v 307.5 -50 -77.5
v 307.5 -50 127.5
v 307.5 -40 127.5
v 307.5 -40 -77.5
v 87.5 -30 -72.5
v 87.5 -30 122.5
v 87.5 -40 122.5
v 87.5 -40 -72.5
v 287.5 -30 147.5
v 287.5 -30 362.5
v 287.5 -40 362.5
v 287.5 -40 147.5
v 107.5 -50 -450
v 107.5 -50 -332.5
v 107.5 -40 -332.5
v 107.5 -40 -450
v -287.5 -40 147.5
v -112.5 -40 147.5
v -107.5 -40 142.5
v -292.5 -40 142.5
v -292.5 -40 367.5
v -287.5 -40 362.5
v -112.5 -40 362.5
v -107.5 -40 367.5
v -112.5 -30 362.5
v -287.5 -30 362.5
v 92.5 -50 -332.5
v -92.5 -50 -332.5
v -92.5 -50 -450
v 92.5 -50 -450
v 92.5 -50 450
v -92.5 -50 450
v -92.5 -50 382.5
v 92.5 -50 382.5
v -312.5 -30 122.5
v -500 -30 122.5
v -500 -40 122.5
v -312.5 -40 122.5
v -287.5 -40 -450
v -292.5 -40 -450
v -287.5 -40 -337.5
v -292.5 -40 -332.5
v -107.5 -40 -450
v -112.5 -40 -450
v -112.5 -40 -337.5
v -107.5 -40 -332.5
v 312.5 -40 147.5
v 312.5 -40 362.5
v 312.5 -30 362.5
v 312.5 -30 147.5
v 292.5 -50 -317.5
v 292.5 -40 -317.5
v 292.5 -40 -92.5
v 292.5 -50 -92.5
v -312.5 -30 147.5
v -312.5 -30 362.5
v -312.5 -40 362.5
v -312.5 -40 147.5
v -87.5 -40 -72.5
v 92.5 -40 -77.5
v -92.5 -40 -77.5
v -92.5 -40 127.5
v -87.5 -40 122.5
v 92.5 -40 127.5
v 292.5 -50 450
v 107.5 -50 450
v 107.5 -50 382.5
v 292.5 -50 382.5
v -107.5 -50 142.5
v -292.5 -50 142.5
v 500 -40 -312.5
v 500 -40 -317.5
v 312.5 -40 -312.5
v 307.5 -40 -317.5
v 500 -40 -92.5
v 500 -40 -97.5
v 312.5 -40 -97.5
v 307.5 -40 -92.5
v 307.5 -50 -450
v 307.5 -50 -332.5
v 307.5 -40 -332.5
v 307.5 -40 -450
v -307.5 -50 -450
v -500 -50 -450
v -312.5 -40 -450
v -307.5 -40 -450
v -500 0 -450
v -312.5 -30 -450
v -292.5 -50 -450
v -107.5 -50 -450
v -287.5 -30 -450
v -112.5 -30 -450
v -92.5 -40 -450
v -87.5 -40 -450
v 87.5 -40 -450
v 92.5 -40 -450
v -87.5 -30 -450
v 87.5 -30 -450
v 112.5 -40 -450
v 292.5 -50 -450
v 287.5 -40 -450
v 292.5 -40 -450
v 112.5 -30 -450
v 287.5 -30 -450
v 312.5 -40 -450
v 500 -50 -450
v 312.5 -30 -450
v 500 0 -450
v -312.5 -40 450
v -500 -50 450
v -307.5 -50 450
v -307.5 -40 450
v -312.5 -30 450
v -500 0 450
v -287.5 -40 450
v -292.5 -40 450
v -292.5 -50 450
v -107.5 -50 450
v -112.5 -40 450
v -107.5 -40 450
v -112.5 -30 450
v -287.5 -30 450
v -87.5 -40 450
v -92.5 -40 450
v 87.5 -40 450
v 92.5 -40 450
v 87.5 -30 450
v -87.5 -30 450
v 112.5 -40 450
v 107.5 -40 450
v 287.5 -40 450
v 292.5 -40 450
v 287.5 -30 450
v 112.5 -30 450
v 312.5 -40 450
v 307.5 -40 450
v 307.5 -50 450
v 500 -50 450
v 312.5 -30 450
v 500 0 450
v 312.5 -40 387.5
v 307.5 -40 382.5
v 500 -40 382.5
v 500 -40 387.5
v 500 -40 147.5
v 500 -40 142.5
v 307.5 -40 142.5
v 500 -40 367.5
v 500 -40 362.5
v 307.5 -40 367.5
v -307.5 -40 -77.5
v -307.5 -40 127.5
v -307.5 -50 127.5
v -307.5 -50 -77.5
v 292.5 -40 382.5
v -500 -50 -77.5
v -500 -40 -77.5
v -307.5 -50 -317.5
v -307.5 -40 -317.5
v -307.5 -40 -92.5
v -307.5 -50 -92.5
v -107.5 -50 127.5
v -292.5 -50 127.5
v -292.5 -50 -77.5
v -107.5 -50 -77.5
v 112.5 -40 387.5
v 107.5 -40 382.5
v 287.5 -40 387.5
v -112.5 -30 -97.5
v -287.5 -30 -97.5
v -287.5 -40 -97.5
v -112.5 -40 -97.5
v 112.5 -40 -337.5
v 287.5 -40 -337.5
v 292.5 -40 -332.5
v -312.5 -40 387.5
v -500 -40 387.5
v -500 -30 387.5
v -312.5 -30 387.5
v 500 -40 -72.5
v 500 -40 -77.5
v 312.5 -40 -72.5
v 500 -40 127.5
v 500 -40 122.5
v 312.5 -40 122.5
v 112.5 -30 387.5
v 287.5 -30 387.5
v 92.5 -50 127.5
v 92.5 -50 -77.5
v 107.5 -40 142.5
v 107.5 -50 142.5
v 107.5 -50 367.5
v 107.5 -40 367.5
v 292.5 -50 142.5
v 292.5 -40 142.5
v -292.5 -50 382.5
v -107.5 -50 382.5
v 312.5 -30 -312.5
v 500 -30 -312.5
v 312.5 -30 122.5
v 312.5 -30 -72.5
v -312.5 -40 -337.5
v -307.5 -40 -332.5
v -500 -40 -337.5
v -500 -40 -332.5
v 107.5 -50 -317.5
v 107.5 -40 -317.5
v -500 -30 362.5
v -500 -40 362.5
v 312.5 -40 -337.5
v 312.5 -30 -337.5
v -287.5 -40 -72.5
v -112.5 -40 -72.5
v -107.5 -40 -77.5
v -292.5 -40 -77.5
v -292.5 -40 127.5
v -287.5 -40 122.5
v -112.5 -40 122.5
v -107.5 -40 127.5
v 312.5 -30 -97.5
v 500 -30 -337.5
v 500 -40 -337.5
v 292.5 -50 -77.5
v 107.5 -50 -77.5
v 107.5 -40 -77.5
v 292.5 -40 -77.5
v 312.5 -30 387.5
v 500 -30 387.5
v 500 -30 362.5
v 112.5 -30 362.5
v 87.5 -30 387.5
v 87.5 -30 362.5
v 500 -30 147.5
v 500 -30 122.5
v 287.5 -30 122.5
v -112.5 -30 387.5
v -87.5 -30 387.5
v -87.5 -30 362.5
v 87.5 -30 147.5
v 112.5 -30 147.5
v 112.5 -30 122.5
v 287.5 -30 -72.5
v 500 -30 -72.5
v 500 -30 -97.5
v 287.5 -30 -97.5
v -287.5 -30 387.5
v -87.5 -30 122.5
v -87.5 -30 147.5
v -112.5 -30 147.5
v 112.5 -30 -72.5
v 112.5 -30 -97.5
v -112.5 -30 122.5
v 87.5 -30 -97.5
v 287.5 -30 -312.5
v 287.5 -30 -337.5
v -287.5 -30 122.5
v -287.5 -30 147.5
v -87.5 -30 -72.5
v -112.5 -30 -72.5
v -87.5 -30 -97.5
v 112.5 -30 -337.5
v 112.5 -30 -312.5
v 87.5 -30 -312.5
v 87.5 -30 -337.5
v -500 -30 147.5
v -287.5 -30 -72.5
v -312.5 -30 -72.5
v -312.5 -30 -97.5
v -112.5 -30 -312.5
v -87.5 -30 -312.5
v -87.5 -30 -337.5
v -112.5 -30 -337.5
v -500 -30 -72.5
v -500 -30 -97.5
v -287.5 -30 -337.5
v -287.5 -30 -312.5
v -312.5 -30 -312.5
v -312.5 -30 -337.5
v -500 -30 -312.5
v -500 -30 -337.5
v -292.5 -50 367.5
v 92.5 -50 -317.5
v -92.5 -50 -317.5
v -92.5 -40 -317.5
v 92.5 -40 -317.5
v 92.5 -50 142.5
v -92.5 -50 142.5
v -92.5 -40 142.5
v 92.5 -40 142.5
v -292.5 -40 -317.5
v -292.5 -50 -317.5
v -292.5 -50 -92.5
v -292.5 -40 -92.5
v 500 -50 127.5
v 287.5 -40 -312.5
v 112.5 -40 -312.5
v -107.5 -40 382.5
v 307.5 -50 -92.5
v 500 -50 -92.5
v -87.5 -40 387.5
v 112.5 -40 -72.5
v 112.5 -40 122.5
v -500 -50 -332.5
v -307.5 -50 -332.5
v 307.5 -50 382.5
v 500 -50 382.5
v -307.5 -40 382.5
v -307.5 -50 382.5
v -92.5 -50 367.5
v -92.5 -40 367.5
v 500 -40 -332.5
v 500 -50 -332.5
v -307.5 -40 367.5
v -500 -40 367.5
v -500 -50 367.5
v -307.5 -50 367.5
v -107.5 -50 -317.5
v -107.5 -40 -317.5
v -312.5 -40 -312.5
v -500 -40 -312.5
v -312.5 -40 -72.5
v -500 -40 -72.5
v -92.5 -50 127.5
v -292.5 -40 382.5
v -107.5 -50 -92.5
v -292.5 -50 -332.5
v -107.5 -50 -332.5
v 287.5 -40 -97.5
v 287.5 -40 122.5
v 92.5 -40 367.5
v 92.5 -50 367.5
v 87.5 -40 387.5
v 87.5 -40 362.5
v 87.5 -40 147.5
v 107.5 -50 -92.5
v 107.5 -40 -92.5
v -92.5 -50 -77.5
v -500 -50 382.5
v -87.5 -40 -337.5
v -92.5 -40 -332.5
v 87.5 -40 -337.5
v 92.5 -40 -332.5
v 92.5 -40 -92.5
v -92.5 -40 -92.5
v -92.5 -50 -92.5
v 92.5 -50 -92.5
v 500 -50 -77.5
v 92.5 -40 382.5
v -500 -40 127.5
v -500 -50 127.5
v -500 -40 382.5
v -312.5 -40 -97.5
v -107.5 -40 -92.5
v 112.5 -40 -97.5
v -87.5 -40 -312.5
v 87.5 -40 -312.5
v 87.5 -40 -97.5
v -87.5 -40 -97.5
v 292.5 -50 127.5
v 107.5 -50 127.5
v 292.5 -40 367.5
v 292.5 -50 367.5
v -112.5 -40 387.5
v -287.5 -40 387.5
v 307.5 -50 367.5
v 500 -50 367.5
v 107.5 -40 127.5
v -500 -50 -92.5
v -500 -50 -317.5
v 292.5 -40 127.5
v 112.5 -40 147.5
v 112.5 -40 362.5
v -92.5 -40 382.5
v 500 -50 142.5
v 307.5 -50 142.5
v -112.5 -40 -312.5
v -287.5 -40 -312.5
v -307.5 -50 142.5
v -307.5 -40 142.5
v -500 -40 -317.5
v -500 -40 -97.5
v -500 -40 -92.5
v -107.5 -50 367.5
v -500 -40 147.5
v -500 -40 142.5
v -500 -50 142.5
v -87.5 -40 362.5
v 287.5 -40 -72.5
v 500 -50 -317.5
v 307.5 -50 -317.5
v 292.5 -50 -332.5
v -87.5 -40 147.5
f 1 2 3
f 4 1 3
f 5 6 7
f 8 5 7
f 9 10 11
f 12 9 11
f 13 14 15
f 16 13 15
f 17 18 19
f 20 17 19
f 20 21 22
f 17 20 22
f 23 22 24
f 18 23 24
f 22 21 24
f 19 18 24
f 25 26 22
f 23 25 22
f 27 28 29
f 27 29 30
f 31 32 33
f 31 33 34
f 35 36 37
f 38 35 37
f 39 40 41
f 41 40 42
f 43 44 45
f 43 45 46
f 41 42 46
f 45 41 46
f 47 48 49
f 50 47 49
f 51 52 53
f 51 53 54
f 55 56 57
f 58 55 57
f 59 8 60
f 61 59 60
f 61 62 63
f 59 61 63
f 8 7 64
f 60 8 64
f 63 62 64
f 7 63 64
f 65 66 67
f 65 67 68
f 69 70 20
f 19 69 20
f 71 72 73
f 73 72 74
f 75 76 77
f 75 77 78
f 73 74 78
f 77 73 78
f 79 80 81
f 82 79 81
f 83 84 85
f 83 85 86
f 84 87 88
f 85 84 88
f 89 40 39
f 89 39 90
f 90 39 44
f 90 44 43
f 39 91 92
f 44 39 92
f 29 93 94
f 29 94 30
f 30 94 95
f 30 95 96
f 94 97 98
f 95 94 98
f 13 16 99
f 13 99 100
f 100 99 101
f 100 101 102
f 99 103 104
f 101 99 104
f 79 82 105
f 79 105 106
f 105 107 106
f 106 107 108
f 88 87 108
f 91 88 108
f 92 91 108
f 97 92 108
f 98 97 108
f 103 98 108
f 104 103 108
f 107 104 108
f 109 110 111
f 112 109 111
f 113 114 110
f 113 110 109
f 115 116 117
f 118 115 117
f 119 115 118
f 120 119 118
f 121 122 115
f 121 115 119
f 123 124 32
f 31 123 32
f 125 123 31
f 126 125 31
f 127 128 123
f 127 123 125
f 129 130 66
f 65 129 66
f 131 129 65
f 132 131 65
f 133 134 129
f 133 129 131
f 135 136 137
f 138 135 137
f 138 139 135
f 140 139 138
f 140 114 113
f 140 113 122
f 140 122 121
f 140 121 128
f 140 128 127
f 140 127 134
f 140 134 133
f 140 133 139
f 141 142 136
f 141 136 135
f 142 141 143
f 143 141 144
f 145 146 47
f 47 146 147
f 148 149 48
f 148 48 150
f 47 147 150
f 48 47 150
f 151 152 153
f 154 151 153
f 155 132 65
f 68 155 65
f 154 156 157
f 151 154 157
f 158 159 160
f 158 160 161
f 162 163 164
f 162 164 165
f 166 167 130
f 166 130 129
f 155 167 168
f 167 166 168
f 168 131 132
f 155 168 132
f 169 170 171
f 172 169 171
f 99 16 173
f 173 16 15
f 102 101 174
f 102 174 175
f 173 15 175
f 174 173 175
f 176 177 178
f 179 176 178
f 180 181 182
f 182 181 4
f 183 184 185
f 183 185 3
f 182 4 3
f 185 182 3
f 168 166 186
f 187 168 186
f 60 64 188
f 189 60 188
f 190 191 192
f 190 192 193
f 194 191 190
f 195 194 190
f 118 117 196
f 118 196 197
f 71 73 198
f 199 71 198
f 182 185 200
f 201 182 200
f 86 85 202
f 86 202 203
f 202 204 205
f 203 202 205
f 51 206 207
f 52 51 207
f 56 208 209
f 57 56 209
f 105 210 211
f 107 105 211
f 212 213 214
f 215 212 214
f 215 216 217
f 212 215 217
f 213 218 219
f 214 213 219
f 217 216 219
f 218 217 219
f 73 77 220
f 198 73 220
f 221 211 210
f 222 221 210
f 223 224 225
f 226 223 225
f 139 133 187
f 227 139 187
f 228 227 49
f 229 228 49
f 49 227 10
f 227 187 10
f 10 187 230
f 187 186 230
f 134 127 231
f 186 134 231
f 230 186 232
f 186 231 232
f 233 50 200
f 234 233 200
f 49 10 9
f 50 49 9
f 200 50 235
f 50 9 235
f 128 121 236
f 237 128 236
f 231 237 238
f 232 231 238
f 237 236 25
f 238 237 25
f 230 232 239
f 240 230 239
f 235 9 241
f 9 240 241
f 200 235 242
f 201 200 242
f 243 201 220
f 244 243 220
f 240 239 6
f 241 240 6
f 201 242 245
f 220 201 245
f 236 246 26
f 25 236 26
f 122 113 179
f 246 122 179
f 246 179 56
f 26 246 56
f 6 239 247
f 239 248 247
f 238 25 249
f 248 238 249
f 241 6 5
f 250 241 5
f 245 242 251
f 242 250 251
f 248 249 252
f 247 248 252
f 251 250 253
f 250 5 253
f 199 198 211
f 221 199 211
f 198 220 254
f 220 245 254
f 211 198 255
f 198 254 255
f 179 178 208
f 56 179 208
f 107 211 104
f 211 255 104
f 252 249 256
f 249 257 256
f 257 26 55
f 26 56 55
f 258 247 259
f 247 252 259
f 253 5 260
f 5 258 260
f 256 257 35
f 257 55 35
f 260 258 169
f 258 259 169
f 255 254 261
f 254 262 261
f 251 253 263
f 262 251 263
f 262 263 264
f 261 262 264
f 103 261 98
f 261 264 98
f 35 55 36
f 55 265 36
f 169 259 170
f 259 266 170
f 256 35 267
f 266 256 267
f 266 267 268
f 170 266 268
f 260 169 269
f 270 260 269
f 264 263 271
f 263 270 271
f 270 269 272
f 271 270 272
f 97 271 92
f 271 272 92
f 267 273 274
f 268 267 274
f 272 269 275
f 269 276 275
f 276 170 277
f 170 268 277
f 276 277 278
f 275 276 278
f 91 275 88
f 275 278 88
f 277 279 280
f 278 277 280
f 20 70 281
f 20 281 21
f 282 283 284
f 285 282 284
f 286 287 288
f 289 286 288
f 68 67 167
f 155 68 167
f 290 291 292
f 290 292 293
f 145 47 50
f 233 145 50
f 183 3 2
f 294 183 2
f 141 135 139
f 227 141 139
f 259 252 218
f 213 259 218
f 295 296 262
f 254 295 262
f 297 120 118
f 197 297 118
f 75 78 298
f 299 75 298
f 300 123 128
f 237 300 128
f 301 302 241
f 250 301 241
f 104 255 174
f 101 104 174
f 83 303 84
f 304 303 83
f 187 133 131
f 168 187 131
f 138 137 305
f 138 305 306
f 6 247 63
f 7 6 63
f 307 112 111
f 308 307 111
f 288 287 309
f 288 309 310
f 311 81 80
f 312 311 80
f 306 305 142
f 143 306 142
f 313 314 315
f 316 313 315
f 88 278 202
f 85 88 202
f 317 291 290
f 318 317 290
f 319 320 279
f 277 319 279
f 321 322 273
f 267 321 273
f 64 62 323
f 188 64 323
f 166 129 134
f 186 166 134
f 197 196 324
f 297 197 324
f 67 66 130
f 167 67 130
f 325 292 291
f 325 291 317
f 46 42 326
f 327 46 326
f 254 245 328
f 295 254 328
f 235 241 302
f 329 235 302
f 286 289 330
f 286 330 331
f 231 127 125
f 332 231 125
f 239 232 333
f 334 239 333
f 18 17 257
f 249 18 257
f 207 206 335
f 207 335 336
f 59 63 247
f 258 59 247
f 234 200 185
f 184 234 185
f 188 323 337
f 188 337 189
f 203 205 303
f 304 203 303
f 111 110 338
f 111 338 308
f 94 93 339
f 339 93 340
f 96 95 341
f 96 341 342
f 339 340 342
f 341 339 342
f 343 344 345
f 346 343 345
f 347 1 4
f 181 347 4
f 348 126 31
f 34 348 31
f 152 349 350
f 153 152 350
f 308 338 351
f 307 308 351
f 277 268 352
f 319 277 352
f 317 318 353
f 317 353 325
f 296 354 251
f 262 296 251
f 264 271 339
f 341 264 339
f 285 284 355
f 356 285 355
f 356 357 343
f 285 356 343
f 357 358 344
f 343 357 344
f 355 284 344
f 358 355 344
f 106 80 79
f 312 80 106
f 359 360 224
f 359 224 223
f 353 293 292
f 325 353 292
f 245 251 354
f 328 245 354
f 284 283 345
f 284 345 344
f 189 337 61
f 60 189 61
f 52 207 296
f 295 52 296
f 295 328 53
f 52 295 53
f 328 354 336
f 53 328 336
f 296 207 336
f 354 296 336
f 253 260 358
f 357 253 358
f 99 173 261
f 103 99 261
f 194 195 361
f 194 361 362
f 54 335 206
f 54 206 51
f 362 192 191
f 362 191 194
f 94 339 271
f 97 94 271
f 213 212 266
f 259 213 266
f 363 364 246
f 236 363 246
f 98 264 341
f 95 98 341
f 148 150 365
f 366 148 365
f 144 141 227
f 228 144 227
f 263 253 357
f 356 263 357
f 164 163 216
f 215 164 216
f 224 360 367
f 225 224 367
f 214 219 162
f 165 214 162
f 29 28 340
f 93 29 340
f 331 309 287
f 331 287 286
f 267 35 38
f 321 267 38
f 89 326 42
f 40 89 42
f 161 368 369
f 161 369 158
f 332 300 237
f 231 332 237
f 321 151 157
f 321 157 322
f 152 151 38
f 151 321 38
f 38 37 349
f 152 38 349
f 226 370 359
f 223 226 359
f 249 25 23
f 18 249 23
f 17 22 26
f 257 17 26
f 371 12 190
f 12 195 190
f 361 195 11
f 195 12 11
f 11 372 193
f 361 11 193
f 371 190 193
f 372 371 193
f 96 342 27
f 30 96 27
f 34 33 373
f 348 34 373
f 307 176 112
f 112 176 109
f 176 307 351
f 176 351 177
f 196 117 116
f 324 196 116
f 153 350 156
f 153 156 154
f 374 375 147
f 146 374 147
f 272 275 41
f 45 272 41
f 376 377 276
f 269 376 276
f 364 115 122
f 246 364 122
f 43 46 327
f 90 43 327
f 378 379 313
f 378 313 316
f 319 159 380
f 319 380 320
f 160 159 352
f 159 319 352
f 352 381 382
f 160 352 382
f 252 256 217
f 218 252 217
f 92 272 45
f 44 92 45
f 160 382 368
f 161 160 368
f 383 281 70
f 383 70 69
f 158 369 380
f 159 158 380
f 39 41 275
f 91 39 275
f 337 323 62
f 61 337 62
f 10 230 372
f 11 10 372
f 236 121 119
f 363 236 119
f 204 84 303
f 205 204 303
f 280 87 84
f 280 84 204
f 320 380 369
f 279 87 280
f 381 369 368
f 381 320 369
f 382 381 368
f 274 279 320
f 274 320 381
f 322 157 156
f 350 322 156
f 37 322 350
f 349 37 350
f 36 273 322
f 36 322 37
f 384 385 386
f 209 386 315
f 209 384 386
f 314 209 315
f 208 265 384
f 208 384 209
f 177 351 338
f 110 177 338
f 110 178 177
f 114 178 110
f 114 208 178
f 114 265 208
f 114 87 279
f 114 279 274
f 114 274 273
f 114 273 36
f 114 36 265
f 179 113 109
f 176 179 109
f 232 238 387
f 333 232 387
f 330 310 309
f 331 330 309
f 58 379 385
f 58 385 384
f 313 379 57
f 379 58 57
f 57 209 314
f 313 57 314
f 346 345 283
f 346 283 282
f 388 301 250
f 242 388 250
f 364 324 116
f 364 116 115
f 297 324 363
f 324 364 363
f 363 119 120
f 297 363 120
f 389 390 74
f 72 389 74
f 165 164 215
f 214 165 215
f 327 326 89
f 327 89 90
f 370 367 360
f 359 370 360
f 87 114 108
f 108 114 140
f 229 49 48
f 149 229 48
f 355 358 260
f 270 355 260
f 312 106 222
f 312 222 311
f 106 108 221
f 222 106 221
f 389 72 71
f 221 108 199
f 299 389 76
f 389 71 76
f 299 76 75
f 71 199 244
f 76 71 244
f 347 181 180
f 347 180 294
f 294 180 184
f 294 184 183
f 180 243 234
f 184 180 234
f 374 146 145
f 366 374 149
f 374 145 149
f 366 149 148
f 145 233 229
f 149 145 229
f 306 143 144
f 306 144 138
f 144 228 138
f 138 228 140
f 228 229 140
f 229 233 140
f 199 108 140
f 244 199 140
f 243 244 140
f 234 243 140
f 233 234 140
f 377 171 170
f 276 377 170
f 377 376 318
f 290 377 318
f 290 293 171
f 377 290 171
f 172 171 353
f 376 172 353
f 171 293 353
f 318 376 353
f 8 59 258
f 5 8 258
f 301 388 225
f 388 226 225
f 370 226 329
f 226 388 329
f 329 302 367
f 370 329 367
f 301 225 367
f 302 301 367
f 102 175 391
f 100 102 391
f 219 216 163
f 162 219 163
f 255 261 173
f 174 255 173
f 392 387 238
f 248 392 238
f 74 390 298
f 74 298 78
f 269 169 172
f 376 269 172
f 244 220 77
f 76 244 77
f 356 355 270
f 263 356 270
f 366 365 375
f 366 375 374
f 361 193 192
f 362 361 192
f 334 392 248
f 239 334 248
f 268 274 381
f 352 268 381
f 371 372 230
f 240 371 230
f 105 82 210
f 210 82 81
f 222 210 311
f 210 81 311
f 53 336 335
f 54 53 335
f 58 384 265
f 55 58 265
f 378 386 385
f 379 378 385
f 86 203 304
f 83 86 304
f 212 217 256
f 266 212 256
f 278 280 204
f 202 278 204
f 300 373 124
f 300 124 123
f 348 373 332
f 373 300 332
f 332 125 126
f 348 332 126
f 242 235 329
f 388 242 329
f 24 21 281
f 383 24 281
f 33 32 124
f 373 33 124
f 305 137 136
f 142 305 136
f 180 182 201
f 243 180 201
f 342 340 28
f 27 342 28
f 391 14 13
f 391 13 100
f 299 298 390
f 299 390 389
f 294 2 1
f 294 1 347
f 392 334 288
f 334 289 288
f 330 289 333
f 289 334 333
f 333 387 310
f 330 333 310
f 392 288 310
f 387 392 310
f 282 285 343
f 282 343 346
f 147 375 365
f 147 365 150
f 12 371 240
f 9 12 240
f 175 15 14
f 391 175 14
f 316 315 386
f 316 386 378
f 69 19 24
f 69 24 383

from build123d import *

# Parameters (mm, degrees)
F0_W     = 1000
F0_H     = 900
F1_DEPTH = 50
F3_DEPTH = 1016
F5_DEPTH = 908


with BuildPart() as f1:
    # F0 (on Front) → F1 (new body)
    with BuildSketch(Plane.XZ):
        Rectangle(F0_W, F0_H)
    extrude(amount=F1_DEPTH)

    # F2 (on face) → F3 (cut)
    with BuildSketch(Plane(origin=(-500, 0, 0), x_dir=(0, -1, 0), z_dir=(-1, 0, 0))):
        Polygon((50, -332.5), (50, -317.5), (40, -317.5), (40, -312.5), (30, -312.5), (30, -337.5), (40, -337.5), (40, -332.5), align=None)
        Polygon((40, -92.5), (50, -92.5), (50, -77.5), (40, -77.5), (40, -72.5), (30, -72.5), (30, -97.5), (40, -97.5), align=None)
        Polygon((40, 127.5), (50, 127.5), (50, 142.5), (40, 142.5), (40, 147.5), (30, 147.5), (30, 122.5), (40, 122.5), align=None)
        Polygon((40, 367.5), (50, 367.5), (50, 382.5), (40, 382.5), (40, 387.5), (30, 387.5), (30, 362.5), (40, 362.5), align=None)
    extrude(amount=-F3_DEPTH, mode=Mode.SUBTRACT)

    # F4 (on face) → F5 (cut)
    with BuildSketch(Plane.XY.offset(450)):
        Polygon((292.5, -50), (307.5, -50), (307.5, -40), (312.5, -40), (312.5, -30), (287.5, -30), (287.5, -40), (292.5, -40), align=None)
        Polygon((92.5, -40), (92.5, -50), (107.5, -50), (107.5, -40), (112.5, -40), (112.5, -30), (87.5, -30), (87.5, -40), align=None)
        Polygon((-107.5, -40), (-107.5, -50), (-92.5, -50), (-92.5, -40), (-87.5, -40), (-87.5, -30), (-112.5, -30), (-112.5, -40), align=None)
        Polygon((-307.5, -40), (-307.5, -50), (-292.5, -50), (-292.5, -40), (-287.5, -40), (-287.5, -30), (-312.5, -30), (-312.5, -40), align=None)
    extrude(amount=-F5_DEPTH, mode=Mode.SUBTRACT)


solid = f1.part
